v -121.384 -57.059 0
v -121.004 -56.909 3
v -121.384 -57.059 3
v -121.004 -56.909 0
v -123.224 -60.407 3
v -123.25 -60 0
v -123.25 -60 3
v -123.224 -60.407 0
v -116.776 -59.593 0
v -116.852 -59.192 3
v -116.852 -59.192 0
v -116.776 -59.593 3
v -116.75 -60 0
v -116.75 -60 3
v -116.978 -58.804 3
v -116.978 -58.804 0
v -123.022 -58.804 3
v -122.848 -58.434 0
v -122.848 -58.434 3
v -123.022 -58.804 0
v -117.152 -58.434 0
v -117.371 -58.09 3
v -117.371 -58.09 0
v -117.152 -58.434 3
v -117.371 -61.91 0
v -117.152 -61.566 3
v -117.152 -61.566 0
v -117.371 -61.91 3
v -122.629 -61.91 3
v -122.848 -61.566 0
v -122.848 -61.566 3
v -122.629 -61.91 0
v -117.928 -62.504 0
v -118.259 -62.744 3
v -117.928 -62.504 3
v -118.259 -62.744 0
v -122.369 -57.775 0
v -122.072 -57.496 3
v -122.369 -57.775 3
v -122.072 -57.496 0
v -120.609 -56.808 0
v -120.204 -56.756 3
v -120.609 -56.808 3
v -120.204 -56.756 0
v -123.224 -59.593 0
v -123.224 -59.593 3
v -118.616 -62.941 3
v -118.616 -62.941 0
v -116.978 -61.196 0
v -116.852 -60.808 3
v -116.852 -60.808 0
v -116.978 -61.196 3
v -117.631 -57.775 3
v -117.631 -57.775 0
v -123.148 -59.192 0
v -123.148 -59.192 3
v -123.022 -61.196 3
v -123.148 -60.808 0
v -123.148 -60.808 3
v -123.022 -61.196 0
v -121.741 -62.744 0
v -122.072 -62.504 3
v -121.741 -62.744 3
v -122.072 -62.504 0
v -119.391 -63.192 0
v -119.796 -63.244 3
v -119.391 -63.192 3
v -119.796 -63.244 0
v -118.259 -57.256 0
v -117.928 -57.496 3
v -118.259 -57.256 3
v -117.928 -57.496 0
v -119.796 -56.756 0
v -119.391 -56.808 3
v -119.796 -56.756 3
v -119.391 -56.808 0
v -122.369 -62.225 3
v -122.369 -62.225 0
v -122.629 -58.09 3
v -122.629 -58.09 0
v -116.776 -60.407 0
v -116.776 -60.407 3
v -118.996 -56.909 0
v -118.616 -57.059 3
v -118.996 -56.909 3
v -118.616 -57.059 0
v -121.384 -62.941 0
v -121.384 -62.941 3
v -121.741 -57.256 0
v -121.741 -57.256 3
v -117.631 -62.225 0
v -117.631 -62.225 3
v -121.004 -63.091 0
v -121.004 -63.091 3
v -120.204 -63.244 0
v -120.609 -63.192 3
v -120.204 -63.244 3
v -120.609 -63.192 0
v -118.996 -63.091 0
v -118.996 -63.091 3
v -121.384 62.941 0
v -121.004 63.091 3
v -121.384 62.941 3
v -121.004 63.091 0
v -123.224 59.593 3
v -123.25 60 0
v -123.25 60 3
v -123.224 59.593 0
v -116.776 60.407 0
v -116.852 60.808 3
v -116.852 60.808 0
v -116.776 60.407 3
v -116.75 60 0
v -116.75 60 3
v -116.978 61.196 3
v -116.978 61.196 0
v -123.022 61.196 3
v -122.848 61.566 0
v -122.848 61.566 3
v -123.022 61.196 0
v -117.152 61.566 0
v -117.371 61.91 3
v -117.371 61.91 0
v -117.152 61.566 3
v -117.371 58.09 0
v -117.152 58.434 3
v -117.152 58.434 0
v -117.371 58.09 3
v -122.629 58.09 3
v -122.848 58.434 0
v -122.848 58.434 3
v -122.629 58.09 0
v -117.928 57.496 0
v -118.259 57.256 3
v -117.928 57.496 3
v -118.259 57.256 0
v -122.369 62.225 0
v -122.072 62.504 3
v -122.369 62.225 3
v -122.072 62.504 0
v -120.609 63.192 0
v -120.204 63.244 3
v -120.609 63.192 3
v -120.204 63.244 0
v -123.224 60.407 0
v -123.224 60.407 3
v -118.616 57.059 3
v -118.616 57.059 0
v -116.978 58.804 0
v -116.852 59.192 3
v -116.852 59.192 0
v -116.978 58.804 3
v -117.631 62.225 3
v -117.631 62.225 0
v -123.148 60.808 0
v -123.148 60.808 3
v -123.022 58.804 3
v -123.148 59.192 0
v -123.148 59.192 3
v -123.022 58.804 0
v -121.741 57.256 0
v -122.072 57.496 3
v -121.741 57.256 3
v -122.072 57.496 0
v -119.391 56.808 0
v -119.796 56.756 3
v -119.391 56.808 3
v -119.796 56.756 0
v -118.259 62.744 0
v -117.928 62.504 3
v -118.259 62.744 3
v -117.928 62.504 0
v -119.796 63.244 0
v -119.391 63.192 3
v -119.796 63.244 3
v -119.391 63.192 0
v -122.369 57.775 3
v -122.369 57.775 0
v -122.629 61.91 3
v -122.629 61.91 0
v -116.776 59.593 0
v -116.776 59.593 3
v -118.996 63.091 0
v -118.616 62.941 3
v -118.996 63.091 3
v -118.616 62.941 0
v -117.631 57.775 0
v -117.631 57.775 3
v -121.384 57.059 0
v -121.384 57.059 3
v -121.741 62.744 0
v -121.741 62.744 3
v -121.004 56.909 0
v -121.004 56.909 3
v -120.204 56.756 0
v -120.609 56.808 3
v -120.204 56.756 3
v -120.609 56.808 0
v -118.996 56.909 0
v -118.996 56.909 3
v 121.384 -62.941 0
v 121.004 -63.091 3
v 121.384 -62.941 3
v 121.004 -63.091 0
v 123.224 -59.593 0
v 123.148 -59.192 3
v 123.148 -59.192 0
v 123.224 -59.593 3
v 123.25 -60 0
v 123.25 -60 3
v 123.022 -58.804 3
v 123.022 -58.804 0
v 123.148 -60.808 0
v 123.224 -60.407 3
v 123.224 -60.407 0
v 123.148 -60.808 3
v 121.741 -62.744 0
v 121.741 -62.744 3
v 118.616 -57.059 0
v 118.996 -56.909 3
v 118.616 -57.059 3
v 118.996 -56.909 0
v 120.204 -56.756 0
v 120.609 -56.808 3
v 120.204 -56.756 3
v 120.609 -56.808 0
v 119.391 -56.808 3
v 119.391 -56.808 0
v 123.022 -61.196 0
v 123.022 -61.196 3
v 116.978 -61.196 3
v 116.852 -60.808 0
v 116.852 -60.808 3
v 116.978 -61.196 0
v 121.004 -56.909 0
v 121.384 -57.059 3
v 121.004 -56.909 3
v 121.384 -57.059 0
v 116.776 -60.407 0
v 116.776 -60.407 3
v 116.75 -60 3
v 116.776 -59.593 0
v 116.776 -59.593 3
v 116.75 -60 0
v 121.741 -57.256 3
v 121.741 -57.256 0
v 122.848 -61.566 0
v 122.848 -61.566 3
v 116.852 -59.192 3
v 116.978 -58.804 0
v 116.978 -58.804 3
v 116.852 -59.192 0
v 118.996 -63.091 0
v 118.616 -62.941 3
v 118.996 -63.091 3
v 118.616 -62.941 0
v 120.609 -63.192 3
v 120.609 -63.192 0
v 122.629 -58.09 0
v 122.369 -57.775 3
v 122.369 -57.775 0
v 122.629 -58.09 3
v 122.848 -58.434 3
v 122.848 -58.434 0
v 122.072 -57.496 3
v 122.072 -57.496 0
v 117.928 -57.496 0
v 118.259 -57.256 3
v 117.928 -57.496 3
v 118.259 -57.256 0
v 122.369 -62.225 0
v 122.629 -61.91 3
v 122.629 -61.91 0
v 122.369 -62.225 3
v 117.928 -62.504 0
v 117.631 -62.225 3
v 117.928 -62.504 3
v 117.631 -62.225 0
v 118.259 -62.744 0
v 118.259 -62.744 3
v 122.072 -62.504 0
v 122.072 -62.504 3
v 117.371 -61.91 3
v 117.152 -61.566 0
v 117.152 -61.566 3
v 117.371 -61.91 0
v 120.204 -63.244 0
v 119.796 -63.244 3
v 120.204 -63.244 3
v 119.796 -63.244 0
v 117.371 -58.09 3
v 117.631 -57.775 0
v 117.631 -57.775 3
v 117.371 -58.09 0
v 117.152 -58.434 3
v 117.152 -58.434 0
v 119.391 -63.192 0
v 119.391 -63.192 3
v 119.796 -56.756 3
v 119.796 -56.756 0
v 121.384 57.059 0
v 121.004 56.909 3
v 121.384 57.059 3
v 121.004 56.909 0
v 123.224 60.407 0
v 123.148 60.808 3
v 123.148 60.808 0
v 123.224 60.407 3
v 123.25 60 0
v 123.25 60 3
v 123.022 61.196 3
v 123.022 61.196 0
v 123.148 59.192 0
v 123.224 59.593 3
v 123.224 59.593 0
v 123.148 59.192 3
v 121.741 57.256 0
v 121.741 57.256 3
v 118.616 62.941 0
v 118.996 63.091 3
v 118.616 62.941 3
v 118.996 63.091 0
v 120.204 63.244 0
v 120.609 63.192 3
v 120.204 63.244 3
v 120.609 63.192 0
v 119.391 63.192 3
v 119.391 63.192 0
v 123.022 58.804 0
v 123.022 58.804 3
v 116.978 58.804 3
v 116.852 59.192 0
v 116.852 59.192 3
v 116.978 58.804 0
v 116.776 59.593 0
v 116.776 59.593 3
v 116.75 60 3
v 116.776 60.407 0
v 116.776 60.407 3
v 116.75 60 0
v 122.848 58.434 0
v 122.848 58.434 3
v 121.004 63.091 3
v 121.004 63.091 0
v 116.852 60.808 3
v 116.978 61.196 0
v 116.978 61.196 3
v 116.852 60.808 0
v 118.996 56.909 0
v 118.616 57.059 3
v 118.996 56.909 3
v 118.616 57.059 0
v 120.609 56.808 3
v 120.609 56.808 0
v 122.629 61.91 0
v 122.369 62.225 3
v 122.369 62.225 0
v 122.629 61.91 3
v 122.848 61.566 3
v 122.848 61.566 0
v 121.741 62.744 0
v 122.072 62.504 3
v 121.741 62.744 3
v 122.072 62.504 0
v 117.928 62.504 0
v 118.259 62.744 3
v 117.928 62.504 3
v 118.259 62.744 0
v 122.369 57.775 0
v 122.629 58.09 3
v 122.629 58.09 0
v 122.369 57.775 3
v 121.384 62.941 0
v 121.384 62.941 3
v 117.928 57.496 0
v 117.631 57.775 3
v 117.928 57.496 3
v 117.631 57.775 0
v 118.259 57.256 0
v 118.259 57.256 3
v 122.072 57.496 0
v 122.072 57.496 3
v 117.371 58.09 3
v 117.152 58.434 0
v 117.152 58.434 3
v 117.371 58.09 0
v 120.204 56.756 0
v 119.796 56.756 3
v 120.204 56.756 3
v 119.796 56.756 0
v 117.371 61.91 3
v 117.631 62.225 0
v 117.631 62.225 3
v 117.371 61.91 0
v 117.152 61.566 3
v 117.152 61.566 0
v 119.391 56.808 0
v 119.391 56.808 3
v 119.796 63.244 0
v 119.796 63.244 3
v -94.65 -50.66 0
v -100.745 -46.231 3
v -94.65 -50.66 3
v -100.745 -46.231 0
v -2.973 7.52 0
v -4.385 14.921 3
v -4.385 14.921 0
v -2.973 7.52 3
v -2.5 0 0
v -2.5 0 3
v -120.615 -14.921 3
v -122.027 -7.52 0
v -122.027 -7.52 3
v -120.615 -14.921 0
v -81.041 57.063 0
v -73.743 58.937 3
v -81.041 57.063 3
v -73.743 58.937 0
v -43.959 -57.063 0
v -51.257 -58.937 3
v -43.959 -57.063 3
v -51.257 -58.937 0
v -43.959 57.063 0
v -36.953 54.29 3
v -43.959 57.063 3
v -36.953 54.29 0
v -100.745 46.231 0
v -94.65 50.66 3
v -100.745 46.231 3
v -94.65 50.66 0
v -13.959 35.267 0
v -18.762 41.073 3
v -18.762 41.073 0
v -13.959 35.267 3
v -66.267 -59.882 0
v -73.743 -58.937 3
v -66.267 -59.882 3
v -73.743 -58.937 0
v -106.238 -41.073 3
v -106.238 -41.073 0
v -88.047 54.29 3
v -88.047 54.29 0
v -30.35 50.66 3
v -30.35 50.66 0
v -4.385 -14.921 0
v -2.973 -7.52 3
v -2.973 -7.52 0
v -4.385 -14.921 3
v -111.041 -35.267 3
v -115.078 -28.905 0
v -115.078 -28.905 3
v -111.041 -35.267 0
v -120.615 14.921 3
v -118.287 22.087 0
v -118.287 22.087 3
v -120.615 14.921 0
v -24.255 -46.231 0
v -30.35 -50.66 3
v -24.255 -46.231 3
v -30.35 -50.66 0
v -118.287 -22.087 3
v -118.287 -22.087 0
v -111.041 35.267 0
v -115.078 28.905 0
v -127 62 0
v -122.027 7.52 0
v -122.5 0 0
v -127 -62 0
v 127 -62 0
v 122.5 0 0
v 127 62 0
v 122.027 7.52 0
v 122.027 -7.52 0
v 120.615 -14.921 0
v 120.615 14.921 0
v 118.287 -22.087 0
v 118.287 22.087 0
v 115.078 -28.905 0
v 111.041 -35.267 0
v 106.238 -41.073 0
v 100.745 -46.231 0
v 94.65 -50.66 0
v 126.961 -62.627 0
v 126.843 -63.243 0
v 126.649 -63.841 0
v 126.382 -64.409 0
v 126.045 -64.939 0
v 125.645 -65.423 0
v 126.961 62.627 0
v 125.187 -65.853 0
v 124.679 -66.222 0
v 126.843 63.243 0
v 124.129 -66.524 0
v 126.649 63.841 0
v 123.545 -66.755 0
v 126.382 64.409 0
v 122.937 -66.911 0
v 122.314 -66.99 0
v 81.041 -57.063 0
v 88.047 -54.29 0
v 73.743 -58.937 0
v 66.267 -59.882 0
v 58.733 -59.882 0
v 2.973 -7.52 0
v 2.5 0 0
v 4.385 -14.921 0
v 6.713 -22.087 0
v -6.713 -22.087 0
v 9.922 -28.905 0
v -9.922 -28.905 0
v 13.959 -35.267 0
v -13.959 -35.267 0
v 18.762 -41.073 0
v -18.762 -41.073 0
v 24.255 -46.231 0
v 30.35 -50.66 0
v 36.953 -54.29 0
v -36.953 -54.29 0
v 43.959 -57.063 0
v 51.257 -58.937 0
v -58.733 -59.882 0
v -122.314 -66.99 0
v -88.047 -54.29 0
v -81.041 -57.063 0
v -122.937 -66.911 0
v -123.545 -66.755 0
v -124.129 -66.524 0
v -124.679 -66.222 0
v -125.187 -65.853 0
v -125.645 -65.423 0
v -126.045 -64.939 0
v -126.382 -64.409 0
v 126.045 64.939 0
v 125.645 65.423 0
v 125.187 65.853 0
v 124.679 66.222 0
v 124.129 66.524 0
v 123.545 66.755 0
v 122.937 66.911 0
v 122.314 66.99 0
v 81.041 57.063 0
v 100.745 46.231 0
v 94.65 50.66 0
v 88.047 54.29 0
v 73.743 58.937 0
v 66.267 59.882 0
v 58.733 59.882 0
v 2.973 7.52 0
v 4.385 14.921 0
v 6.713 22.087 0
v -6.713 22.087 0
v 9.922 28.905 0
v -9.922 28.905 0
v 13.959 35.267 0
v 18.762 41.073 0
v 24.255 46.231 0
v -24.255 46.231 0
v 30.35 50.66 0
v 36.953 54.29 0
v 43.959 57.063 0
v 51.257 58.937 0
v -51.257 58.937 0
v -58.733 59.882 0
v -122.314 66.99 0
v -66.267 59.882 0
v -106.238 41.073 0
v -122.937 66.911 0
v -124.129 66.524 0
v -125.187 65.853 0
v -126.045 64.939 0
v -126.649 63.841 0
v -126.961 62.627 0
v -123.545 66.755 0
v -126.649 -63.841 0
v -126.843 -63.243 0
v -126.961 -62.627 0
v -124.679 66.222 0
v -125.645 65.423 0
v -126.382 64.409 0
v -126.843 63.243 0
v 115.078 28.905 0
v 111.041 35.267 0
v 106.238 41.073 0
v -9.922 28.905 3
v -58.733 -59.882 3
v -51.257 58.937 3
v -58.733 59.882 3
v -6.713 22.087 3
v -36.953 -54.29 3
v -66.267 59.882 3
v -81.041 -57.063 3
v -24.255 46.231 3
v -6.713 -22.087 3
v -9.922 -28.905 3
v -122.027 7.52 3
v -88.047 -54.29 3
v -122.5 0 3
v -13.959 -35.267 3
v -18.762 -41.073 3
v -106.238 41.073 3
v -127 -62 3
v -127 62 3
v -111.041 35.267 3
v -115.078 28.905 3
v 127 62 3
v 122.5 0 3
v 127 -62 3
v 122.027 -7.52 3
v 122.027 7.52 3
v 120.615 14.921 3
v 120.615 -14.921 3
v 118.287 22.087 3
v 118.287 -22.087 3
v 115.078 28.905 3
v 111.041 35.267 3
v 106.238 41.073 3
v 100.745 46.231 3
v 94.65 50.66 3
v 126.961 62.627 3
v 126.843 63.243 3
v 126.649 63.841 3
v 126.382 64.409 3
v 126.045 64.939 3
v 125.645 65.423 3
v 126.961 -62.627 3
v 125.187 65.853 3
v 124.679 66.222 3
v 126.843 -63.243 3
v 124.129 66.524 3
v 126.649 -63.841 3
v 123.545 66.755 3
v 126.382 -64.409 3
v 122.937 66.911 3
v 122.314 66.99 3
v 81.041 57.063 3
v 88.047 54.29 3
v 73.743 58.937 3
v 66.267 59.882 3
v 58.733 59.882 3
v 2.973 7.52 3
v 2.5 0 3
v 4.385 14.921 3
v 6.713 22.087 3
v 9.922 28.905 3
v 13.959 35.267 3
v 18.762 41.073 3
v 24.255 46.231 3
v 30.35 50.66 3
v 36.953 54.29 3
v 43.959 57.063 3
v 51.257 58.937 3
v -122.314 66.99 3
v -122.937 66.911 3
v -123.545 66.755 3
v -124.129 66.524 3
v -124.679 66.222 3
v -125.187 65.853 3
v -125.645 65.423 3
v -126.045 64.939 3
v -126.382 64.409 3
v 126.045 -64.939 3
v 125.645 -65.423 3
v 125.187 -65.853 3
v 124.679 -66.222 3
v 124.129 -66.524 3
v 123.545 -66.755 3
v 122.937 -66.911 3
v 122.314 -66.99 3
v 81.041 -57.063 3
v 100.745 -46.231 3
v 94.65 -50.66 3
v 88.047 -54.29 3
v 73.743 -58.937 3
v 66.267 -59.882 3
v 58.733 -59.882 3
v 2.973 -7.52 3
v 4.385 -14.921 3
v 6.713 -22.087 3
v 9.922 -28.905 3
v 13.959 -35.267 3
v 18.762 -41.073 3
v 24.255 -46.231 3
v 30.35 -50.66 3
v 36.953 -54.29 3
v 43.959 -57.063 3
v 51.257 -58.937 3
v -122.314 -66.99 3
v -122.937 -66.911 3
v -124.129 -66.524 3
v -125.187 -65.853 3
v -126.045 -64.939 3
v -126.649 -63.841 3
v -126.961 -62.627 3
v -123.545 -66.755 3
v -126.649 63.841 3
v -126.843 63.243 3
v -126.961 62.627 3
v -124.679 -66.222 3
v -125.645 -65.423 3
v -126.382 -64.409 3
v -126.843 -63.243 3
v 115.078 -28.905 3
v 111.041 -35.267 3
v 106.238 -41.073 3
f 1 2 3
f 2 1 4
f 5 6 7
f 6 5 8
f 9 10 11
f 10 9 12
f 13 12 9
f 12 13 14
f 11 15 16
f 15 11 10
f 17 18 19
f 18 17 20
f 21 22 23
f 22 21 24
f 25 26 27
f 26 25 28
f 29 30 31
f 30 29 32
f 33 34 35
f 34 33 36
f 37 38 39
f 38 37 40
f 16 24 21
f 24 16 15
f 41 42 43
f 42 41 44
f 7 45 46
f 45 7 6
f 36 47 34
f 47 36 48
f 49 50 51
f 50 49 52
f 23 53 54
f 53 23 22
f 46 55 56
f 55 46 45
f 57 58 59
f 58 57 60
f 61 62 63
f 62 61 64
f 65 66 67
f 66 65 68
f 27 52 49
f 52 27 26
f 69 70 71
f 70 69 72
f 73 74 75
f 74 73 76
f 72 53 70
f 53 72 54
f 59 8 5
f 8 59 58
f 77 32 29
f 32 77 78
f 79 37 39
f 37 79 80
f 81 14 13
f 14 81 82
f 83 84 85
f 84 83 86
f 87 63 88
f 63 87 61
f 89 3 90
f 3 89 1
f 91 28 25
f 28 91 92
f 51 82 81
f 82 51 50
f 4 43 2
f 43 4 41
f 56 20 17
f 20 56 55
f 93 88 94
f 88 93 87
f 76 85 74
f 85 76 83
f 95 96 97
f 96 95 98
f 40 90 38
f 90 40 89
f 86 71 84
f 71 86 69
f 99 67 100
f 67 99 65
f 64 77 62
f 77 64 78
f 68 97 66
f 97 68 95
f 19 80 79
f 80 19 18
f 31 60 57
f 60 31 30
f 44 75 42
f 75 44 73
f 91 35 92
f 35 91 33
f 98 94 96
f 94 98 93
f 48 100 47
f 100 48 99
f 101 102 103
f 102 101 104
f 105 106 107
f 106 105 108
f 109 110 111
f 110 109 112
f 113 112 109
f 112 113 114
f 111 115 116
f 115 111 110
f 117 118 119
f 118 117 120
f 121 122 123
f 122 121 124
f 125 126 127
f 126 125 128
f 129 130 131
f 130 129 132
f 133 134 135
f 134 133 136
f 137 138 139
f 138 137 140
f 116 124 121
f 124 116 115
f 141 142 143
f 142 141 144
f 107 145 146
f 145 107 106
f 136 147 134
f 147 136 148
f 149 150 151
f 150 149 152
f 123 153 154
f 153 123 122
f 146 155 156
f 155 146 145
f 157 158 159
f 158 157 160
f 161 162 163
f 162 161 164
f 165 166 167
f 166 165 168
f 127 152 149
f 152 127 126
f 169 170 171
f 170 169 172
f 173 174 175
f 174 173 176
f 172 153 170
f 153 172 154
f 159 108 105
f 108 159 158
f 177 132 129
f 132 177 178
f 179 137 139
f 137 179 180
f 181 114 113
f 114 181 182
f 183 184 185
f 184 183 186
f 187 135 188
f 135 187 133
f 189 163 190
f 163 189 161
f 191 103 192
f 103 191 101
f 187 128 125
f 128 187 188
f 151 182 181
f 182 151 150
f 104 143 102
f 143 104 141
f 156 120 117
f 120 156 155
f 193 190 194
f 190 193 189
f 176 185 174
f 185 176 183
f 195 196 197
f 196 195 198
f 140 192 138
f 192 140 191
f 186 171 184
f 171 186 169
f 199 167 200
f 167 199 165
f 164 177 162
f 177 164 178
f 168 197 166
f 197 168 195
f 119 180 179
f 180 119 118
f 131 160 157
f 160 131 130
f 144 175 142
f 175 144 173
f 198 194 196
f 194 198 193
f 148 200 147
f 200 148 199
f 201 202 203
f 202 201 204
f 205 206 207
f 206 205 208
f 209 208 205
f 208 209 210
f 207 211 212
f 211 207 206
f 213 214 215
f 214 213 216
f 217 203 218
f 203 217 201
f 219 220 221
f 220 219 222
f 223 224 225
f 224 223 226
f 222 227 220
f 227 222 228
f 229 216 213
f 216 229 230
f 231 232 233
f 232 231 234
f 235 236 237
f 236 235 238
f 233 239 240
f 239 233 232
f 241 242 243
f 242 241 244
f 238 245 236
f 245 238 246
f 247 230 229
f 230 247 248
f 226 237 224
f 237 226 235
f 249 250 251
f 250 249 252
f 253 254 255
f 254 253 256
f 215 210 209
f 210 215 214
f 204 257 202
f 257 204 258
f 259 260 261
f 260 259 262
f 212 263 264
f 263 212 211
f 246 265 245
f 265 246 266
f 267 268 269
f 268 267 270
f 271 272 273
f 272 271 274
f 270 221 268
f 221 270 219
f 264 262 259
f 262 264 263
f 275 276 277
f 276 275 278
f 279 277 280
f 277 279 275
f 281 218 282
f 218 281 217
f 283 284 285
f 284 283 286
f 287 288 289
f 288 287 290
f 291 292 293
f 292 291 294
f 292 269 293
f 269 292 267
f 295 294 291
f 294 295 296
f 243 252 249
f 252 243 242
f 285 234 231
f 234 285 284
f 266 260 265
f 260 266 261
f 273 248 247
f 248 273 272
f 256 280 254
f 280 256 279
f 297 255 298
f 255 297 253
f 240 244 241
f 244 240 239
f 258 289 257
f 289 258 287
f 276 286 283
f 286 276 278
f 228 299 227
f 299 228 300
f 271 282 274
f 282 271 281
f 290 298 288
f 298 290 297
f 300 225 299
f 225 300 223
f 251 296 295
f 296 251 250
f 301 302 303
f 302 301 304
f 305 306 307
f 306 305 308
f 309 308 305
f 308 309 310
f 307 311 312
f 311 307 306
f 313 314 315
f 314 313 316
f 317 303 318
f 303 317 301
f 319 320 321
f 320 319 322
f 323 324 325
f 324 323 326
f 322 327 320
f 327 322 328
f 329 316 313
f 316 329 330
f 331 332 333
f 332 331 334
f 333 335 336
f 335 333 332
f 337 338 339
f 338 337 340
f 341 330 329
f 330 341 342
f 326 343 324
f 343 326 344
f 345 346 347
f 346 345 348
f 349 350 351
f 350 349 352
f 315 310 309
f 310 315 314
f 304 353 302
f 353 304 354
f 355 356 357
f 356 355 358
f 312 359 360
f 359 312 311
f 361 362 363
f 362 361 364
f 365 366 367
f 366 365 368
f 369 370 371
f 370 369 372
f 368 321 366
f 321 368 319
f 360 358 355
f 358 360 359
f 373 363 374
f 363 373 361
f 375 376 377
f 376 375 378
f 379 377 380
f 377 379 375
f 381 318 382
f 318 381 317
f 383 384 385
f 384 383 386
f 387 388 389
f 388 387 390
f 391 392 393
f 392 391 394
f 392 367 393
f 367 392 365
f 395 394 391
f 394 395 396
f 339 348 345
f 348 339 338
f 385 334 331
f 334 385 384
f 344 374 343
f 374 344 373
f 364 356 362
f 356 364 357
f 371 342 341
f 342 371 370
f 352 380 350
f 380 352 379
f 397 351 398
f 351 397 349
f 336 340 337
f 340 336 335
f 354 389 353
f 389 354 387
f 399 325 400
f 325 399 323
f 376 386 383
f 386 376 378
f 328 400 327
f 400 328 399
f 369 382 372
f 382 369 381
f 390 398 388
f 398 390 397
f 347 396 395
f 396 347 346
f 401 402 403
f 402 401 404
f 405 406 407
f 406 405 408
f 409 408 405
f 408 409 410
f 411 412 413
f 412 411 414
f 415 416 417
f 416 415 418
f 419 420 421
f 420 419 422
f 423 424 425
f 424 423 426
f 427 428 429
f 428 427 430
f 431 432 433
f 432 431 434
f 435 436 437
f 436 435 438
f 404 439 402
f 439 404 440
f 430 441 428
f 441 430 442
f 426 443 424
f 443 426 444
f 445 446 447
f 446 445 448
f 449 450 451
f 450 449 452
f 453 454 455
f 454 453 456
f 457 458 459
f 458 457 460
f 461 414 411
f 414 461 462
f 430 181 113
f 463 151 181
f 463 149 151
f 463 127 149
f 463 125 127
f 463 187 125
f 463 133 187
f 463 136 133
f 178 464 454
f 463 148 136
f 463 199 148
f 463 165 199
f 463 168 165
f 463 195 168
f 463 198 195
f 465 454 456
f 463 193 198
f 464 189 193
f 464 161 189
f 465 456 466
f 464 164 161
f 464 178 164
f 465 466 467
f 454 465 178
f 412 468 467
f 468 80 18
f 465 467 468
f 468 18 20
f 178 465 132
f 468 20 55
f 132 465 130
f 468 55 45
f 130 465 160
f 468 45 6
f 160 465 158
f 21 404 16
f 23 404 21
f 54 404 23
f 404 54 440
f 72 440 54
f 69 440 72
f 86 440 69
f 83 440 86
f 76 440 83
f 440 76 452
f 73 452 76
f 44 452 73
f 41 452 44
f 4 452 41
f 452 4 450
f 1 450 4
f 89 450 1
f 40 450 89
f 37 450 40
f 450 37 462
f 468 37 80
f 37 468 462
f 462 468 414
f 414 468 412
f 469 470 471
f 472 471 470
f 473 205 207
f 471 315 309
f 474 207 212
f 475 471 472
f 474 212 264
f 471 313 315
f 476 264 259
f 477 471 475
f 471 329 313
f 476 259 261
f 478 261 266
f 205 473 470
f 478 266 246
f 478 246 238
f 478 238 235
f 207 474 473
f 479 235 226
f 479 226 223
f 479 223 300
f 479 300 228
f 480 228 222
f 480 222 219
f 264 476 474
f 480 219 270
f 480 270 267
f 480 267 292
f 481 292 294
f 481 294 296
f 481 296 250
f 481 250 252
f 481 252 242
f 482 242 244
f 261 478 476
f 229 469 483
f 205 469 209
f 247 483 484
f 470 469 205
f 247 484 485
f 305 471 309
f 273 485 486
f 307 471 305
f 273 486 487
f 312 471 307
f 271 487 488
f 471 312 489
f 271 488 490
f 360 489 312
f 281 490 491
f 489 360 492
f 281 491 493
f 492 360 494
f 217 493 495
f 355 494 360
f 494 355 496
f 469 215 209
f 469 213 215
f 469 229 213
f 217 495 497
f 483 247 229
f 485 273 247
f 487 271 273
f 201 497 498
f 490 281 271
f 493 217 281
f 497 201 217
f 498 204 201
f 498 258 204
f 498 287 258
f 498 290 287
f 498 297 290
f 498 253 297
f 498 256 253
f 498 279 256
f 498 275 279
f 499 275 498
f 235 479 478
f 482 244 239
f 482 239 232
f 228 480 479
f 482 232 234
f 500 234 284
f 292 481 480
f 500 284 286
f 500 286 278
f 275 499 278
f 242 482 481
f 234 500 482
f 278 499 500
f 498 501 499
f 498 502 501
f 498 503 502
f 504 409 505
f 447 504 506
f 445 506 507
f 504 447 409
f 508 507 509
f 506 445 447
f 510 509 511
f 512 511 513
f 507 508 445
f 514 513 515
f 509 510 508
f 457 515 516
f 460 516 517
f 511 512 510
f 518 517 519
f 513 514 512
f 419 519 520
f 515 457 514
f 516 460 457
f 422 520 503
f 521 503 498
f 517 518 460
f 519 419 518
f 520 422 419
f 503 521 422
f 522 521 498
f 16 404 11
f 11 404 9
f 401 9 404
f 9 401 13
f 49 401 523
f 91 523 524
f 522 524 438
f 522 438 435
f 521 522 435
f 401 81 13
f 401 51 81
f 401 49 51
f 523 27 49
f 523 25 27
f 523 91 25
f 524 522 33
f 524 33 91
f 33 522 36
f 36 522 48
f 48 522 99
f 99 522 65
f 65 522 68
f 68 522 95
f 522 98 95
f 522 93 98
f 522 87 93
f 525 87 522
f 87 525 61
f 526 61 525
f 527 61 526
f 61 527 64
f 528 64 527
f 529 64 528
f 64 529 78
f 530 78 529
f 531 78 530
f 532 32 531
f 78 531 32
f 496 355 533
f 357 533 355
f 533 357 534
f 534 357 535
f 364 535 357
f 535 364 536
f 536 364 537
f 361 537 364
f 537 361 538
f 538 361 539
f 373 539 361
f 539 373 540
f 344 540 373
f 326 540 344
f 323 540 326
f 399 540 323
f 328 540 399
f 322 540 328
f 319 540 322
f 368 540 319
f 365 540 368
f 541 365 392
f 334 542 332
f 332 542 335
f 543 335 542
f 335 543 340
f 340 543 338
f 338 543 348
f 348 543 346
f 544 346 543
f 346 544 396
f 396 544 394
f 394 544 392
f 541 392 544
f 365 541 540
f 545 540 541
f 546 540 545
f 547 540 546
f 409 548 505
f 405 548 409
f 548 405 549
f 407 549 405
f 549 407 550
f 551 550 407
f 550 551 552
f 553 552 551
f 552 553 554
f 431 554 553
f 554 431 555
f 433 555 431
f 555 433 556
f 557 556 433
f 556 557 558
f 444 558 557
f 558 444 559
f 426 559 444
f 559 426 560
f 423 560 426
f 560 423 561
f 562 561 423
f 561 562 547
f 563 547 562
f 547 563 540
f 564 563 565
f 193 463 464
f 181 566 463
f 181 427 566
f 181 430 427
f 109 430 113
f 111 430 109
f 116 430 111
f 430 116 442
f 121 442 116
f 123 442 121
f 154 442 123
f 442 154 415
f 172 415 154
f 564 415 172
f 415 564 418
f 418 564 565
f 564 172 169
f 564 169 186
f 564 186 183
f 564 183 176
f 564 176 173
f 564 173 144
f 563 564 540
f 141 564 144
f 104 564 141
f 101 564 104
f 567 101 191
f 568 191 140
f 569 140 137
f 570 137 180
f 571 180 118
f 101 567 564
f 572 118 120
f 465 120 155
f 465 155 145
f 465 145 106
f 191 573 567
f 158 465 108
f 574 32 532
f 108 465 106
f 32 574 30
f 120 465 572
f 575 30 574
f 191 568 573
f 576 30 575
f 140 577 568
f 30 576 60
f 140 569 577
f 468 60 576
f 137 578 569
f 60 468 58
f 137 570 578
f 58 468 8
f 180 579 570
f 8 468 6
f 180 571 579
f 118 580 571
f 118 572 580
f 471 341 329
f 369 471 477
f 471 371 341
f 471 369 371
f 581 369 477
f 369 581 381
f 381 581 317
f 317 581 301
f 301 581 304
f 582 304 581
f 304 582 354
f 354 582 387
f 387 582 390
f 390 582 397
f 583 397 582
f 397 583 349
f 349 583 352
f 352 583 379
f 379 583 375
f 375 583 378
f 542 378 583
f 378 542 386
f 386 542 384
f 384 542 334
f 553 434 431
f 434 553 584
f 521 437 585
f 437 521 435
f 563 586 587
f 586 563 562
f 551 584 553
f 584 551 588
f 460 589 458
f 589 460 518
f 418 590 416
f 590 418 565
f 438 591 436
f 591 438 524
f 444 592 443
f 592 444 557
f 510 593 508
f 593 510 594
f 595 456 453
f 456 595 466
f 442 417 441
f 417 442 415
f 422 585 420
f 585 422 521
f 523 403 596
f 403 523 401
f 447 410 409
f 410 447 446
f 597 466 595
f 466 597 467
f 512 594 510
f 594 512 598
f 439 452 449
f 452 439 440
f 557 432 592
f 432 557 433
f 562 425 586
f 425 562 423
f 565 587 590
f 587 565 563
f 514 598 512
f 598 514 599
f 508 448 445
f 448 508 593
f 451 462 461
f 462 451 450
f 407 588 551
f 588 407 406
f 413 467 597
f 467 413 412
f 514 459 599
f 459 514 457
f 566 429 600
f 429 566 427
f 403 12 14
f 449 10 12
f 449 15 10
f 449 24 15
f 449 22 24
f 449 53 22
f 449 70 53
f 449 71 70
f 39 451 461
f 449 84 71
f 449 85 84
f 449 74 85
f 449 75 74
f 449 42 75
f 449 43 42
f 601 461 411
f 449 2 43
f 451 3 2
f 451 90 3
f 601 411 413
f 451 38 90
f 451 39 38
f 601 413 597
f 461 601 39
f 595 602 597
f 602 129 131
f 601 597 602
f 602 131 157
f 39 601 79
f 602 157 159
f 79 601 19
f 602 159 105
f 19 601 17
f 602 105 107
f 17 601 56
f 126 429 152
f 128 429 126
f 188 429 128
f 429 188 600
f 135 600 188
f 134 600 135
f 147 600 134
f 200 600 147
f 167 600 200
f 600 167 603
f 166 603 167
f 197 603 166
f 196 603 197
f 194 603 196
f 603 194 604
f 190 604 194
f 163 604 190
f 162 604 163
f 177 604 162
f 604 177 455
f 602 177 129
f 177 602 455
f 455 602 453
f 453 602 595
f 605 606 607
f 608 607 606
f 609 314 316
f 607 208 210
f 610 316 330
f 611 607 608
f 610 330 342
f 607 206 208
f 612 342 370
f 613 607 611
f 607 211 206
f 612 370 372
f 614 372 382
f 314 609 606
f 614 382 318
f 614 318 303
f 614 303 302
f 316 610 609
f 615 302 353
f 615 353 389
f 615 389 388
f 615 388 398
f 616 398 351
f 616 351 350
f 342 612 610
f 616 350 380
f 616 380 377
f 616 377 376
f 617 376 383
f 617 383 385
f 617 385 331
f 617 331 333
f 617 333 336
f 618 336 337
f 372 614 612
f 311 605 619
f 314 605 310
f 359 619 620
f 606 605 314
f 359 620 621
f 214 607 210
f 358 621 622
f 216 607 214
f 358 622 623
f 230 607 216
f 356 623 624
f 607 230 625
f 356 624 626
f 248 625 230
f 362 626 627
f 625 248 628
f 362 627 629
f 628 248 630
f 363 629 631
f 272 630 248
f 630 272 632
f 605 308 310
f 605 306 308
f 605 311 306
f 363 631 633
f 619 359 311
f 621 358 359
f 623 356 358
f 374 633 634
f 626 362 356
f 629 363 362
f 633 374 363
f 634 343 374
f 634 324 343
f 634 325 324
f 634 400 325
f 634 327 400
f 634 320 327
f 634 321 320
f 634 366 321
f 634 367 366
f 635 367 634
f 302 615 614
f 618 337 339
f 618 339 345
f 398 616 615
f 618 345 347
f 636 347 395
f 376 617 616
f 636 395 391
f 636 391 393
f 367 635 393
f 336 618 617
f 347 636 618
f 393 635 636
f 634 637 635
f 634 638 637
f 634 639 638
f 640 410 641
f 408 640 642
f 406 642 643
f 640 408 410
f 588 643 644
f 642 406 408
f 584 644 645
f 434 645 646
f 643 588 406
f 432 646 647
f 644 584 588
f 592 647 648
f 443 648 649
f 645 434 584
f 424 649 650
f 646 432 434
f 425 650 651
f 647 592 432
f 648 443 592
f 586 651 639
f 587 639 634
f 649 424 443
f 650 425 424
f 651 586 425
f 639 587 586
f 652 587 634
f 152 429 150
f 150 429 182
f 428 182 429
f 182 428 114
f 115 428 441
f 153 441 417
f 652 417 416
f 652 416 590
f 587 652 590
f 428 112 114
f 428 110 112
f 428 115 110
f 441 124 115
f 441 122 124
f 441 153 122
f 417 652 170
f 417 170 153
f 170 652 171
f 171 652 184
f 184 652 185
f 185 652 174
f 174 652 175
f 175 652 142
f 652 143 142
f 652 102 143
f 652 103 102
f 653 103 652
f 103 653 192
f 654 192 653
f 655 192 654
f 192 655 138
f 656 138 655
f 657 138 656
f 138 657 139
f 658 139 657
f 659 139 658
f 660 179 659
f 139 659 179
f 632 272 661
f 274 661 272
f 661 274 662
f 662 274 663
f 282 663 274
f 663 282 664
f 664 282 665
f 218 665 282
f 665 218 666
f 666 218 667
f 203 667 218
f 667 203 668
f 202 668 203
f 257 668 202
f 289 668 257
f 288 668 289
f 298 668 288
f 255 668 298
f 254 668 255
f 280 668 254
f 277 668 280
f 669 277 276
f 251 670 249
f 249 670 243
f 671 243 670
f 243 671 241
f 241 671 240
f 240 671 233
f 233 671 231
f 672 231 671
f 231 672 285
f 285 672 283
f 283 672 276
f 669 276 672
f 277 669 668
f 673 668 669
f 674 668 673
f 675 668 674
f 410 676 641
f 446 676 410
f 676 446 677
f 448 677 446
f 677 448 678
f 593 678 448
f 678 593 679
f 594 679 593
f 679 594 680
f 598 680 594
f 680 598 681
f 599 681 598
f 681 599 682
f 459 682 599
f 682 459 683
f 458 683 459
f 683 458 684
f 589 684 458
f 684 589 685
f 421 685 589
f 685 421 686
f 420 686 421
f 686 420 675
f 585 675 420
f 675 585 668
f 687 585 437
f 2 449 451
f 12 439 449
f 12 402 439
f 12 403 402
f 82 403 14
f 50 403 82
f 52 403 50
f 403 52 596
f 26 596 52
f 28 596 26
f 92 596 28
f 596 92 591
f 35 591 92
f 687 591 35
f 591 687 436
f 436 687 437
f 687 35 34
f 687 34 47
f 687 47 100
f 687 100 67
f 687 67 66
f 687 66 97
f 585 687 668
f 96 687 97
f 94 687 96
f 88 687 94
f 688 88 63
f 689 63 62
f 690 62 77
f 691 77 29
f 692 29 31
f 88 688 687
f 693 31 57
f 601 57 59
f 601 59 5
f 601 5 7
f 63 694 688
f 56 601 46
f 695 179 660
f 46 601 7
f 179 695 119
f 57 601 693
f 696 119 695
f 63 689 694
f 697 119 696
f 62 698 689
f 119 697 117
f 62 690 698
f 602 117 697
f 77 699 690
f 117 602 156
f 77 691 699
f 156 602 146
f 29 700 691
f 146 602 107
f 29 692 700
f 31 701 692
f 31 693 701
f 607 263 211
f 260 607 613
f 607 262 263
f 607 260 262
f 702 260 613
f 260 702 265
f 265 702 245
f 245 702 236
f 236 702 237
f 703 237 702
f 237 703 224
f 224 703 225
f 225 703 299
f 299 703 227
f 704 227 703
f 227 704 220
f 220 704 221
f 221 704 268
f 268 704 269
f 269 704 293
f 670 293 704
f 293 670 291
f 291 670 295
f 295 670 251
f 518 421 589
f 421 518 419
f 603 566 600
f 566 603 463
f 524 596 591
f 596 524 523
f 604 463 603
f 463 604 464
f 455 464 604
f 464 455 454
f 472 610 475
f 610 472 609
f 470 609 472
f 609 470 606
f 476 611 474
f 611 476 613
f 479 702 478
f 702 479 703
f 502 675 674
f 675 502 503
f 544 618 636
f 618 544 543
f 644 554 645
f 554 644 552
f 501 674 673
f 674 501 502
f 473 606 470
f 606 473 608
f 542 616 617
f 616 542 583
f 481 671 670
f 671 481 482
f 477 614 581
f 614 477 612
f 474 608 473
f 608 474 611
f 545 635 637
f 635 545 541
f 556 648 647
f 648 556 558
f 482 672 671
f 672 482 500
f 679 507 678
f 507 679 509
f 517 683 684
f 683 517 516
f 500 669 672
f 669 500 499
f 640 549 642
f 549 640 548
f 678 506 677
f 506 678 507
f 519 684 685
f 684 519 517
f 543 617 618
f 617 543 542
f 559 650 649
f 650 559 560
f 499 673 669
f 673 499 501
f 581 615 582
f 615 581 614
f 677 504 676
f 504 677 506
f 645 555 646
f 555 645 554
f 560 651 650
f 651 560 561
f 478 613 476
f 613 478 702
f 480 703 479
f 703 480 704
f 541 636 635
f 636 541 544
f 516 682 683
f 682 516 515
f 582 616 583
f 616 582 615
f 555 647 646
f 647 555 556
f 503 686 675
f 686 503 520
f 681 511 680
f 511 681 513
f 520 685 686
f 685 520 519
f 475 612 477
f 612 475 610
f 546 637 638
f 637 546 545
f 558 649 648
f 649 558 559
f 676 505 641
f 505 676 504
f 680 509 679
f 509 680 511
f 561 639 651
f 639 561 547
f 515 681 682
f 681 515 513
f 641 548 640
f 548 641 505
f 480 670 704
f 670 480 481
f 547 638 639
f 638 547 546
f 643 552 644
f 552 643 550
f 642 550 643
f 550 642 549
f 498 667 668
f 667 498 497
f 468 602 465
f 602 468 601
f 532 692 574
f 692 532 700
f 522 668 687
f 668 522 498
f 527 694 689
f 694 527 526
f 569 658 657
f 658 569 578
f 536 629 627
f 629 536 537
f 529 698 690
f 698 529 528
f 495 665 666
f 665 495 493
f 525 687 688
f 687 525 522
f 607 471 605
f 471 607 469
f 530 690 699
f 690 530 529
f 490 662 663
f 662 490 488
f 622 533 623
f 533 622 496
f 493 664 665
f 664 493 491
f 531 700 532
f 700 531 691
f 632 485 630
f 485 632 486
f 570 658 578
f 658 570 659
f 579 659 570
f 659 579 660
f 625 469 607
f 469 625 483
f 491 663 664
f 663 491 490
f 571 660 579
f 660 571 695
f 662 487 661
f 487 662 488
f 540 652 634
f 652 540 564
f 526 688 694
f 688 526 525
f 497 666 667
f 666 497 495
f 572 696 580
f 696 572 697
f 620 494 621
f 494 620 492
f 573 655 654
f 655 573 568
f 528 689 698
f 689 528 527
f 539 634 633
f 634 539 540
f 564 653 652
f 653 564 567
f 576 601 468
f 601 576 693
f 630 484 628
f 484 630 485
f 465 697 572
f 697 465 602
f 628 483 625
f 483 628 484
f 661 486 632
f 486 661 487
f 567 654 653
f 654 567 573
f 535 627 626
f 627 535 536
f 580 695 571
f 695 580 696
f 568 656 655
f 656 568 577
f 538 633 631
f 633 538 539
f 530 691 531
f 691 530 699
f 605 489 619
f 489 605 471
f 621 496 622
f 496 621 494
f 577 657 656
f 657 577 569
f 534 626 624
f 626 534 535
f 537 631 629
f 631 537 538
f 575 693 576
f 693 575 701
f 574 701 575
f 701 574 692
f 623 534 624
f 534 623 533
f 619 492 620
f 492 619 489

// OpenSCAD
$fn = 50;

difference() {
	union() {
		hull() {
			translate(v = [-122.0, 62.0, 0]) {
				cylinder(h = 3, r = 5);
			}
			translate(v = [122.0, 62.0, 0]) {
				cylinder(h = 3, r = 5);
			}
			translate(v = [-122.0, -62.0, 0]) {
				cylinder(h = 3, r = 5);
			}
			translate(v = [122.0, -62.0, 0]) {
				cylinder(h = 3, r = 5);
			}
		}
	}
	union() {
		translate(v = [-120.0, -60.0, -100.0]) {
			cylinder(h = 200, r = 3.25);
		}
		translate(v = [-120.0, 60.0, -100.0]) {
			cylinder(h = 200, r = 3.25);
		}
		translate(v = [120.0, -60.0, -100.0]) {
			cylinder(h = 200, r = 3.25);
		}
		translate(v = [120.0, 60.0, -100.0]) {
			cylinder(h = 200, r = 3.25);
		}
		translate(v = [-120.0, -60.0, -100.0]) {
			cylinder(h = 200, r = 1.8);
		}
		translate(v = [-120.0, 60.0, -100.0]) {
			cylinder(h = 200, r = 1.8);
		}
		translate(v = [120.0, -60.0, -100.0]) {
			cylinder(h = 200, r = 1.8);
		}
		translate(v = [120.0, 60.0, -100.0]) {
			cylinder(h = 200, r = 1.8);
		}
		translate(v = [-62.5, 0, 0.0]) {
			cylinder(h = 3, r = 60.0);
		}
		translate(v = [62.5, 0, 0.0]) {
			cylinder(h = 3, r = 60.0);
		}
	}
}
